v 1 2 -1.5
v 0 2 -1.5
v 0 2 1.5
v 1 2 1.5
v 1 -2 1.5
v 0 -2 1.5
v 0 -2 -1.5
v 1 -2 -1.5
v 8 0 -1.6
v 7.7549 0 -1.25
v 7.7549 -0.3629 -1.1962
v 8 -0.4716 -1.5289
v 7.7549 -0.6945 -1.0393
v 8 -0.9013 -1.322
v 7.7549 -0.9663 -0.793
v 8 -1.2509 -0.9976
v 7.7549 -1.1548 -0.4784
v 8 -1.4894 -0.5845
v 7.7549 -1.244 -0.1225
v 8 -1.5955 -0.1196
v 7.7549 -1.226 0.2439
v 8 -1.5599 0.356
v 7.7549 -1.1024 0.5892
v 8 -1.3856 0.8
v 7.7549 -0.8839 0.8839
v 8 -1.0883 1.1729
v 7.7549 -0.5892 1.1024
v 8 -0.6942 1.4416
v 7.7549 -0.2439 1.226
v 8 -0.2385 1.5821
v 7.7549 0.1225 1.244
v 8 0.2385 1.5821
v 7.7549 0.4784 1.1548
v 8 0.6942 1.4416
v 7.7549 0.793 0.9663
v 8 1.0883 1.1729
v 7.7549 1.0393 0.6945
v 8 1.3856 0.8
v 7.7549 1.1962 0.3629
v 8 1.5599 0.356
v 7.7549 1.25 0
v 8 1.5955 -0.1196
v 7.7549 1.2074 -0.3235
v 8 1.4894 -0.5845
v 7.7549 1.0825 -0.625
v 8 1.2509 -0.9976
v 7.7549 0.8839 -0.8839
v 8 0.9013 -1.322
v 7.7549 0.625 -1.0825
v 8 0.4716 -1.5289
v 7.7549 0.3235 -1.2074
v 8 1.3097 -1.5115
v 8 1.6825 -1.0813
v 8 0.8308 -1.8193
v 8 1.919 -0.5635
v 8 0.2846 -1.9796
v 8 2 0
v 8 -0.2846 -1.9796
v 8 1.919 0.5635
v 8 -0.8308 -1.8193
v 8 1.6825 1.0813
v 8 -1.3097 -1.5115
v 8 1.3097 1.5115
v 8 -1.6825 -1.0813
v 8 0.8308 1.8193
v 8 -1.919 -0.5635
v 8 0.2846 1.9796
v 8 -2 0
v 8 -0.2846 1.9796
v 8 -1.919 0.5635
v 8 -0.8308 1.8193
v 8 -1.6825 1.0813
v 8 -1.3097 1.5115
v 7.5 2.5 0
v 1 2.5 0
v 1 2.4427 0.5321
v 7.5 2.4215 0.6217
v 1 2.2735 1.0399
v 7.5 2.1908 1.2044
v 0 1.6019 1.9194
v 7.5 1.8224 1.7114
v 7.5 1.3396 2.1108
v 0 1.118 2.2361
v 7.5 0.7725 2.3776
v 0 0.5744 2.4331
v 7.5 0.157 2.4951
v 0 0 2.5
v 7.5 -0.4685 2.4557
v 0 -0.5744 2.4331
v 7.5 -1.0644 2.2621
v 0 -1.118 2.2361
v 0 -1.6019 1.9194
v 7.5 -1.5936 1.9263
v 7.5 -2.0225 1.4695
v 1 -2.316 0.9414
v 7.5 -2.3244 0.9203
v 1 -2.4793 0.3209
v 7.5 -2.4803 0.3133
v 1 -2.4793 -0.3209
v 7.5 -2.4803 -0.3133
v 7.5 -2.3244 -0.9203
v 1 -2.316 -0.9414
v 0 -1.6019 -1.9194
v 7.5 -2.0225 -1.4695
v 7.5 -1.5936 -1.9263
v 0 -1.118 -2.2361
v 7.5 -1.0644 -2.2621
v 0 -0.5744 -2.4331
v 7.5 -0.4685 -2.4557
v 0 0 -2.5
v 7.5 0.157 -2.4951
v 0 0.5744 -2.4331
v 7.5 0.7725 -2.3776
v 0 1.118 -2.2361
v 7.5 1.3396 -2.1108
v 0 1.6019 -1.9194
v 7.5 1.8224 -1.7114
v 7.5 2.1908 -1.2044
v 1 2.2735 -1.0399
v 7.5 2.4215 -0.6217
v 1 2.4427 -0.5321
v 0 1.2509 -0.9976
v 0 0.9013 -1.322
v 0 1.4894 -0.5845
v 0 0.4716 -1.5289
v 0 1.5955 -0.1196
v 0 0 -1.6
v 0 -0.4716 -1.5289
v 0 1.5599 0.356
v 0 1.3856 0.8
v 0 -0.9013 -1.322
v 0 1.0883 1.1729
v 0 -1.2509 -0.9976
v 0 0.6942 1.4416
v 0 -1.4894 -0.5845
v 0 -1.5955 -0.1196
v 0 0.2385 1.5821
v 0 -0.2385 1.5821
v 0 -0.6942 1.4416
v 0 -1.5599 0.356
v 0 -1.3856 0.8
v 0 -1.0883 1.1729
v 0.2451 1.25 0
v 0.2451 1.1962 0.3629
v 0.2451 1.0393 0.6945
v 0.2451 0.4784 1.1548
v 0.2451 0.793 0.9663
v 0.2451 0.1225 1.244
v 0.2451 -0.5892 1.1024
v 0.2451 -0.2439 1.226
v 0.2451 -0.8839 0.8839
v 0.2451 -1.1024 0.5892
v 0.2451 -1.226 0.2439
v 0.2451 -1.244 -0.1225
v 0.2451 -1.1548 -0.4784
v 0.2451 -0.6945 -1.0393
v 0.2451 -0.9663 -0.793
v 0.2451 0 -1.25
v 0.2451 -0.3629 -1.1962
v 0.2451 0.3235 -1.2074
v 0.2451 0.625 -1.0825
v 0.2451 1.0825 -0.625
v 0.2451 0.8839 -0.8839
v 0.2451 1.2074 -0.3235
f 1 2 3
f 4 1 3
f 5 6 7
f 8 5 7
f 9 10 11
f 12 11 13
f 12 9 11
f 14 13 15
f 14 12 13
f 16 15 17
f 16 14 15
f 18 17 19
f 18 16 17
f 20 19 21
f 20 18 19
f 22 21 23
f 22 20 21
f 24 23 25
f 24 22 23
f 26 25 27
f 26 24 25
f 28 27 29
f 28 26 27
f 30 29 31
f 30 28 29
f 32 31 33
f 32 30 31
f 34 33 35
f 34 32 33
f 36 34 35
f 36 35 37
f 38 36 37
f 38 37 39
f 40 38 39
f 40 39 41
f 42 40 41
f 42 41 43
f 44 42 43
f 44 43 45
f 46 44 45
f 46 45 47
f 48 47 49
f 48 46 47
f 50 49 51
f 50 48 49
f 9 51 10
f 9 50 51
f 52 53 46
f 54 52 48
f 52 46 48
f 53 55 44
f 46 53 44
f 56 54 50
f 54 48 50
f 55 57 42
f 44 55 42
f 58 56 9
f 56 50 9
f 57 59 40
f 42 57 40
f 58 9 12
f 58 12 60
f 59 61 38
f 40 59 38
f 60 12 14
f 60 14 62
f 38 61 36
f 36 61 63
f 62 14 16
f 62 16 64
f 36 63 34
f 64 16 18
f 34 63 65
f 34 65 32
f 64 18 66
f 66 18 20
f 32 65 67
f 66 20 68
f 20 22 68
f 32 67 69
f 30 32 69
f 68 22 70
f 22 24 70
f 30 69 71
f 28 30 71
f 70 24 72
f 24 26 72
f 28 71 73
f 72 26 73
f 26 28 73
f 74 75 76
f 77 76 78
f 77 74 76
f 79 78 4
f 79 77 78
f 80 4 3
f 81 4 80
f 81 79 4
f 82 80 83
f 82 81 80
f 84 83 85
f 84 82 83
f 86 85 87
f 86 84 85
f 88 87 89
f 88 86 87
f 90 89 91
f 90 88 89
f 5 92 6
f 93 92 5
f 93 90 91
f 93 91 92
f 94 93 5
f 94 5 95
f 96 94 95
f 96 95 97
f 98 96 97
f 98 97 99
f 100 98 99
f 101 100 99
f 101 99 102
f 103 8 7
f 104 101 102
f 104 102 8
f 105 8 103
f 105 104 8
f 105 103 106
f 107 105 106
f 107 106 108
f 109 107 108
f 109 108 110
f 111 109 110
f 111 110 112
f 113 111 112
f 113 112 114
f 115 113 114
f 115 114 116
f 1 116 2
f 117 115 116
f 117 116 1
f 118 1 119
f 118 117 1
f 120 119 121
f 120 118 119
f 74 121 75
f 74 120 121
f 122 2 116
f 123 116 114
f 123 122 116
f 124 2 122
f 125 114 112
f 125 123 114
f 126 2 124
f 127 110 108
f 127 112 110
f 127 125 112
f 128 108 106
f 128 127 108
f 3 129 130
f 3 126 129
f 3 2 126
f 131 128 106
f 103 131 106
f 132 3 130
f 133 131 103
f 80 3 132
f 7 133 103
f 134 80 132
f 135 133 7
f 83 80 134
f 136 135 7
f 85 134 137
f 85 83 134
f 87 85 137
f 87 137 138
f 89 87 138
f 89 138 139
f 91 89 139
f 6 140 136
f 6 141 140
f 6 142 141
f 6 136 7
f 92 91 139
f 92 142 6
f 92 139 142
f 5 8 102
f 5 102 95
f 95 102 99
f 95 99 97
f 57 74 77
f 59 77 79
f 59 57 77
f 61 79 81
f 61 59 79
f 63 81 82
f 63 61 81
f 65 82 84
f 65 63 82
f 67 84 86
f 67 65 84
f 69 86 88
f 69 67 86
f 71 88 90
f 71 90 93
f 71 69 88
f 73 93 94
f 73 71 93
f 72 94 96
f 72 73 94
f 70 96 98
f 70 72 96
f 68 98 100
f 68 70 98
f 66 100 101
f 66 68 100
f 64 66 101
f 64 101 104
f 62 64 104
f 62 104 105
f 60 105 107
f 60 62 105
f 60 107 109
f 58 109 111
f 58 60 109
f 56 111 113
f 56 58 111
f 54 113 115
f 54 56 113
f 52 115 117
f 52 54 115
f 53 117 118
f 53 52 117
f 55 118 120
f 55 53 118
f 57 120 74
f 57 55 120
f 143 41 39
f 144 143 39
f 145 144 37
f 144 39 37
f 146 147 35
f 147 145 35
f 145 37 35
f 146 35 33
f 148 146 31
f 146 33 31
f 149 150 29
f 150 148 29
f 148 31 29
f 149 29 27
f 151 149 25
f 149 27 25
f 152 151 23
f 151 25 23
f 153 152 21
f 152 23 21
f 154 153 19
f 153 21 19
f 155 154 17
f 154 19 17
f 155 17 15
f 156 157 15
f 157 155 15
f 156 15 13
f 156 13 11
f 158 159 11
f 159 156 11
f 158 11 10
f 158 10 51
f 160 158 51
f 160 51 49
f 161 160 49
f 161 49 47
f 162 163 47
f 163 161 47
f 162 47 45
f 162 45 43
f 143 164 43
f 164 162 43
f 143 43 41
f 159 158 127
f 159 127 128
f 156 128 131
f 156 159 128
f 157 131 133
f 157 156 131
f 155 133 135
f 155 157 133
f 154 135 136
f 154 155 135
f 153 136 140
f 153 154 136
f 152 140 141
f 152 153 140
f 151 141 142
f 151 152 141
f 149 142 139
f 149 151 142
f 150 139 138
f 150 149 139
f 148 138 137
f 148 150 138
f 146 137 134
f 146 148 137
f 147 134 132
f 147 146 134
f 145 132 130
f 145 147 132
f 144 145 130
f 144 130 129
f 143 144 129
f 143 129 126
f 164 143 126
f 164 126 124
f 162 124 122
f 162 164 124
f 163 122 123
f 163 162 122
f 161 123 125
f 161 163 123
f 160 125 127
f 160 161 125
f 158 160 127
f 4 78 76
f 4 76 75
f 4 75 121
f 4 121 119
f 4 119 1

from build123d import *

# Parameters (mm, degrees)
SKETCH_1_W          = 8
SKETCH_1_H          = 1.25
CHAMFER_1_SIZE      = 0.5
CUT_EXTRUDE_1_DEPTH = 1


with BuildPart() as part:
    # Эскиз1 → Повернуть1 (revolve)
    with BuildSketch(Plane.XY):
        with Locations((4, 1.875)):
            Rectangle(SKETCH_1_W, SKETCH_1_H)
    revolve(axis=Axis((0, 0, 0), (1, 0, 0)))

    # Эскиз2 → Отверстие обработанное метчиком M31 (revolve, cut)
    with BuildSketch(Plane(origin=(8, 0, 0), x_dir=(0, 0, -1), z_dir=(0, 1, 0))):
        Polygon((0, 0), (0, 8), (1.6, 8), (1.25, 7.754927362), (1.25, 0.245072638), (1.6, 0), align=None)
    revolve(axis=Axis((14.35, 0, 0), (-1, 0, 0)), mode=Mode.SUBTRACT)

    # Фаска1
    chamfer_1_edges = [part.edges().sort_by_distance(p)[0] for p in [
        (8, -2.5, 0),
    ]]
    chamfer(chamfer_1_edges, length=CHAMFER_1_SIZE)

    # Эскиз4 → Вырез-Вытянуть1 (cut)
    with BuildSketch(Plane.ZY):
        with BuildLine():
            ThreePointArc((1.5, 2), (0, 2.5), (-1.5, 2))
            Line((-1.5, 2), (1.5, 2))
        make_face()
        with BuildLine():
            Line((1.5, -2), (-1.5, -2))
            ThreePointArc((-1.5, -2), (0, -2.5), (1.5, -2))
        make_face()
    extrude(amount=-CUT_EXTRUDE_1_DEPTH, mode=Mode.SUBTRACT)


solid = part.part
